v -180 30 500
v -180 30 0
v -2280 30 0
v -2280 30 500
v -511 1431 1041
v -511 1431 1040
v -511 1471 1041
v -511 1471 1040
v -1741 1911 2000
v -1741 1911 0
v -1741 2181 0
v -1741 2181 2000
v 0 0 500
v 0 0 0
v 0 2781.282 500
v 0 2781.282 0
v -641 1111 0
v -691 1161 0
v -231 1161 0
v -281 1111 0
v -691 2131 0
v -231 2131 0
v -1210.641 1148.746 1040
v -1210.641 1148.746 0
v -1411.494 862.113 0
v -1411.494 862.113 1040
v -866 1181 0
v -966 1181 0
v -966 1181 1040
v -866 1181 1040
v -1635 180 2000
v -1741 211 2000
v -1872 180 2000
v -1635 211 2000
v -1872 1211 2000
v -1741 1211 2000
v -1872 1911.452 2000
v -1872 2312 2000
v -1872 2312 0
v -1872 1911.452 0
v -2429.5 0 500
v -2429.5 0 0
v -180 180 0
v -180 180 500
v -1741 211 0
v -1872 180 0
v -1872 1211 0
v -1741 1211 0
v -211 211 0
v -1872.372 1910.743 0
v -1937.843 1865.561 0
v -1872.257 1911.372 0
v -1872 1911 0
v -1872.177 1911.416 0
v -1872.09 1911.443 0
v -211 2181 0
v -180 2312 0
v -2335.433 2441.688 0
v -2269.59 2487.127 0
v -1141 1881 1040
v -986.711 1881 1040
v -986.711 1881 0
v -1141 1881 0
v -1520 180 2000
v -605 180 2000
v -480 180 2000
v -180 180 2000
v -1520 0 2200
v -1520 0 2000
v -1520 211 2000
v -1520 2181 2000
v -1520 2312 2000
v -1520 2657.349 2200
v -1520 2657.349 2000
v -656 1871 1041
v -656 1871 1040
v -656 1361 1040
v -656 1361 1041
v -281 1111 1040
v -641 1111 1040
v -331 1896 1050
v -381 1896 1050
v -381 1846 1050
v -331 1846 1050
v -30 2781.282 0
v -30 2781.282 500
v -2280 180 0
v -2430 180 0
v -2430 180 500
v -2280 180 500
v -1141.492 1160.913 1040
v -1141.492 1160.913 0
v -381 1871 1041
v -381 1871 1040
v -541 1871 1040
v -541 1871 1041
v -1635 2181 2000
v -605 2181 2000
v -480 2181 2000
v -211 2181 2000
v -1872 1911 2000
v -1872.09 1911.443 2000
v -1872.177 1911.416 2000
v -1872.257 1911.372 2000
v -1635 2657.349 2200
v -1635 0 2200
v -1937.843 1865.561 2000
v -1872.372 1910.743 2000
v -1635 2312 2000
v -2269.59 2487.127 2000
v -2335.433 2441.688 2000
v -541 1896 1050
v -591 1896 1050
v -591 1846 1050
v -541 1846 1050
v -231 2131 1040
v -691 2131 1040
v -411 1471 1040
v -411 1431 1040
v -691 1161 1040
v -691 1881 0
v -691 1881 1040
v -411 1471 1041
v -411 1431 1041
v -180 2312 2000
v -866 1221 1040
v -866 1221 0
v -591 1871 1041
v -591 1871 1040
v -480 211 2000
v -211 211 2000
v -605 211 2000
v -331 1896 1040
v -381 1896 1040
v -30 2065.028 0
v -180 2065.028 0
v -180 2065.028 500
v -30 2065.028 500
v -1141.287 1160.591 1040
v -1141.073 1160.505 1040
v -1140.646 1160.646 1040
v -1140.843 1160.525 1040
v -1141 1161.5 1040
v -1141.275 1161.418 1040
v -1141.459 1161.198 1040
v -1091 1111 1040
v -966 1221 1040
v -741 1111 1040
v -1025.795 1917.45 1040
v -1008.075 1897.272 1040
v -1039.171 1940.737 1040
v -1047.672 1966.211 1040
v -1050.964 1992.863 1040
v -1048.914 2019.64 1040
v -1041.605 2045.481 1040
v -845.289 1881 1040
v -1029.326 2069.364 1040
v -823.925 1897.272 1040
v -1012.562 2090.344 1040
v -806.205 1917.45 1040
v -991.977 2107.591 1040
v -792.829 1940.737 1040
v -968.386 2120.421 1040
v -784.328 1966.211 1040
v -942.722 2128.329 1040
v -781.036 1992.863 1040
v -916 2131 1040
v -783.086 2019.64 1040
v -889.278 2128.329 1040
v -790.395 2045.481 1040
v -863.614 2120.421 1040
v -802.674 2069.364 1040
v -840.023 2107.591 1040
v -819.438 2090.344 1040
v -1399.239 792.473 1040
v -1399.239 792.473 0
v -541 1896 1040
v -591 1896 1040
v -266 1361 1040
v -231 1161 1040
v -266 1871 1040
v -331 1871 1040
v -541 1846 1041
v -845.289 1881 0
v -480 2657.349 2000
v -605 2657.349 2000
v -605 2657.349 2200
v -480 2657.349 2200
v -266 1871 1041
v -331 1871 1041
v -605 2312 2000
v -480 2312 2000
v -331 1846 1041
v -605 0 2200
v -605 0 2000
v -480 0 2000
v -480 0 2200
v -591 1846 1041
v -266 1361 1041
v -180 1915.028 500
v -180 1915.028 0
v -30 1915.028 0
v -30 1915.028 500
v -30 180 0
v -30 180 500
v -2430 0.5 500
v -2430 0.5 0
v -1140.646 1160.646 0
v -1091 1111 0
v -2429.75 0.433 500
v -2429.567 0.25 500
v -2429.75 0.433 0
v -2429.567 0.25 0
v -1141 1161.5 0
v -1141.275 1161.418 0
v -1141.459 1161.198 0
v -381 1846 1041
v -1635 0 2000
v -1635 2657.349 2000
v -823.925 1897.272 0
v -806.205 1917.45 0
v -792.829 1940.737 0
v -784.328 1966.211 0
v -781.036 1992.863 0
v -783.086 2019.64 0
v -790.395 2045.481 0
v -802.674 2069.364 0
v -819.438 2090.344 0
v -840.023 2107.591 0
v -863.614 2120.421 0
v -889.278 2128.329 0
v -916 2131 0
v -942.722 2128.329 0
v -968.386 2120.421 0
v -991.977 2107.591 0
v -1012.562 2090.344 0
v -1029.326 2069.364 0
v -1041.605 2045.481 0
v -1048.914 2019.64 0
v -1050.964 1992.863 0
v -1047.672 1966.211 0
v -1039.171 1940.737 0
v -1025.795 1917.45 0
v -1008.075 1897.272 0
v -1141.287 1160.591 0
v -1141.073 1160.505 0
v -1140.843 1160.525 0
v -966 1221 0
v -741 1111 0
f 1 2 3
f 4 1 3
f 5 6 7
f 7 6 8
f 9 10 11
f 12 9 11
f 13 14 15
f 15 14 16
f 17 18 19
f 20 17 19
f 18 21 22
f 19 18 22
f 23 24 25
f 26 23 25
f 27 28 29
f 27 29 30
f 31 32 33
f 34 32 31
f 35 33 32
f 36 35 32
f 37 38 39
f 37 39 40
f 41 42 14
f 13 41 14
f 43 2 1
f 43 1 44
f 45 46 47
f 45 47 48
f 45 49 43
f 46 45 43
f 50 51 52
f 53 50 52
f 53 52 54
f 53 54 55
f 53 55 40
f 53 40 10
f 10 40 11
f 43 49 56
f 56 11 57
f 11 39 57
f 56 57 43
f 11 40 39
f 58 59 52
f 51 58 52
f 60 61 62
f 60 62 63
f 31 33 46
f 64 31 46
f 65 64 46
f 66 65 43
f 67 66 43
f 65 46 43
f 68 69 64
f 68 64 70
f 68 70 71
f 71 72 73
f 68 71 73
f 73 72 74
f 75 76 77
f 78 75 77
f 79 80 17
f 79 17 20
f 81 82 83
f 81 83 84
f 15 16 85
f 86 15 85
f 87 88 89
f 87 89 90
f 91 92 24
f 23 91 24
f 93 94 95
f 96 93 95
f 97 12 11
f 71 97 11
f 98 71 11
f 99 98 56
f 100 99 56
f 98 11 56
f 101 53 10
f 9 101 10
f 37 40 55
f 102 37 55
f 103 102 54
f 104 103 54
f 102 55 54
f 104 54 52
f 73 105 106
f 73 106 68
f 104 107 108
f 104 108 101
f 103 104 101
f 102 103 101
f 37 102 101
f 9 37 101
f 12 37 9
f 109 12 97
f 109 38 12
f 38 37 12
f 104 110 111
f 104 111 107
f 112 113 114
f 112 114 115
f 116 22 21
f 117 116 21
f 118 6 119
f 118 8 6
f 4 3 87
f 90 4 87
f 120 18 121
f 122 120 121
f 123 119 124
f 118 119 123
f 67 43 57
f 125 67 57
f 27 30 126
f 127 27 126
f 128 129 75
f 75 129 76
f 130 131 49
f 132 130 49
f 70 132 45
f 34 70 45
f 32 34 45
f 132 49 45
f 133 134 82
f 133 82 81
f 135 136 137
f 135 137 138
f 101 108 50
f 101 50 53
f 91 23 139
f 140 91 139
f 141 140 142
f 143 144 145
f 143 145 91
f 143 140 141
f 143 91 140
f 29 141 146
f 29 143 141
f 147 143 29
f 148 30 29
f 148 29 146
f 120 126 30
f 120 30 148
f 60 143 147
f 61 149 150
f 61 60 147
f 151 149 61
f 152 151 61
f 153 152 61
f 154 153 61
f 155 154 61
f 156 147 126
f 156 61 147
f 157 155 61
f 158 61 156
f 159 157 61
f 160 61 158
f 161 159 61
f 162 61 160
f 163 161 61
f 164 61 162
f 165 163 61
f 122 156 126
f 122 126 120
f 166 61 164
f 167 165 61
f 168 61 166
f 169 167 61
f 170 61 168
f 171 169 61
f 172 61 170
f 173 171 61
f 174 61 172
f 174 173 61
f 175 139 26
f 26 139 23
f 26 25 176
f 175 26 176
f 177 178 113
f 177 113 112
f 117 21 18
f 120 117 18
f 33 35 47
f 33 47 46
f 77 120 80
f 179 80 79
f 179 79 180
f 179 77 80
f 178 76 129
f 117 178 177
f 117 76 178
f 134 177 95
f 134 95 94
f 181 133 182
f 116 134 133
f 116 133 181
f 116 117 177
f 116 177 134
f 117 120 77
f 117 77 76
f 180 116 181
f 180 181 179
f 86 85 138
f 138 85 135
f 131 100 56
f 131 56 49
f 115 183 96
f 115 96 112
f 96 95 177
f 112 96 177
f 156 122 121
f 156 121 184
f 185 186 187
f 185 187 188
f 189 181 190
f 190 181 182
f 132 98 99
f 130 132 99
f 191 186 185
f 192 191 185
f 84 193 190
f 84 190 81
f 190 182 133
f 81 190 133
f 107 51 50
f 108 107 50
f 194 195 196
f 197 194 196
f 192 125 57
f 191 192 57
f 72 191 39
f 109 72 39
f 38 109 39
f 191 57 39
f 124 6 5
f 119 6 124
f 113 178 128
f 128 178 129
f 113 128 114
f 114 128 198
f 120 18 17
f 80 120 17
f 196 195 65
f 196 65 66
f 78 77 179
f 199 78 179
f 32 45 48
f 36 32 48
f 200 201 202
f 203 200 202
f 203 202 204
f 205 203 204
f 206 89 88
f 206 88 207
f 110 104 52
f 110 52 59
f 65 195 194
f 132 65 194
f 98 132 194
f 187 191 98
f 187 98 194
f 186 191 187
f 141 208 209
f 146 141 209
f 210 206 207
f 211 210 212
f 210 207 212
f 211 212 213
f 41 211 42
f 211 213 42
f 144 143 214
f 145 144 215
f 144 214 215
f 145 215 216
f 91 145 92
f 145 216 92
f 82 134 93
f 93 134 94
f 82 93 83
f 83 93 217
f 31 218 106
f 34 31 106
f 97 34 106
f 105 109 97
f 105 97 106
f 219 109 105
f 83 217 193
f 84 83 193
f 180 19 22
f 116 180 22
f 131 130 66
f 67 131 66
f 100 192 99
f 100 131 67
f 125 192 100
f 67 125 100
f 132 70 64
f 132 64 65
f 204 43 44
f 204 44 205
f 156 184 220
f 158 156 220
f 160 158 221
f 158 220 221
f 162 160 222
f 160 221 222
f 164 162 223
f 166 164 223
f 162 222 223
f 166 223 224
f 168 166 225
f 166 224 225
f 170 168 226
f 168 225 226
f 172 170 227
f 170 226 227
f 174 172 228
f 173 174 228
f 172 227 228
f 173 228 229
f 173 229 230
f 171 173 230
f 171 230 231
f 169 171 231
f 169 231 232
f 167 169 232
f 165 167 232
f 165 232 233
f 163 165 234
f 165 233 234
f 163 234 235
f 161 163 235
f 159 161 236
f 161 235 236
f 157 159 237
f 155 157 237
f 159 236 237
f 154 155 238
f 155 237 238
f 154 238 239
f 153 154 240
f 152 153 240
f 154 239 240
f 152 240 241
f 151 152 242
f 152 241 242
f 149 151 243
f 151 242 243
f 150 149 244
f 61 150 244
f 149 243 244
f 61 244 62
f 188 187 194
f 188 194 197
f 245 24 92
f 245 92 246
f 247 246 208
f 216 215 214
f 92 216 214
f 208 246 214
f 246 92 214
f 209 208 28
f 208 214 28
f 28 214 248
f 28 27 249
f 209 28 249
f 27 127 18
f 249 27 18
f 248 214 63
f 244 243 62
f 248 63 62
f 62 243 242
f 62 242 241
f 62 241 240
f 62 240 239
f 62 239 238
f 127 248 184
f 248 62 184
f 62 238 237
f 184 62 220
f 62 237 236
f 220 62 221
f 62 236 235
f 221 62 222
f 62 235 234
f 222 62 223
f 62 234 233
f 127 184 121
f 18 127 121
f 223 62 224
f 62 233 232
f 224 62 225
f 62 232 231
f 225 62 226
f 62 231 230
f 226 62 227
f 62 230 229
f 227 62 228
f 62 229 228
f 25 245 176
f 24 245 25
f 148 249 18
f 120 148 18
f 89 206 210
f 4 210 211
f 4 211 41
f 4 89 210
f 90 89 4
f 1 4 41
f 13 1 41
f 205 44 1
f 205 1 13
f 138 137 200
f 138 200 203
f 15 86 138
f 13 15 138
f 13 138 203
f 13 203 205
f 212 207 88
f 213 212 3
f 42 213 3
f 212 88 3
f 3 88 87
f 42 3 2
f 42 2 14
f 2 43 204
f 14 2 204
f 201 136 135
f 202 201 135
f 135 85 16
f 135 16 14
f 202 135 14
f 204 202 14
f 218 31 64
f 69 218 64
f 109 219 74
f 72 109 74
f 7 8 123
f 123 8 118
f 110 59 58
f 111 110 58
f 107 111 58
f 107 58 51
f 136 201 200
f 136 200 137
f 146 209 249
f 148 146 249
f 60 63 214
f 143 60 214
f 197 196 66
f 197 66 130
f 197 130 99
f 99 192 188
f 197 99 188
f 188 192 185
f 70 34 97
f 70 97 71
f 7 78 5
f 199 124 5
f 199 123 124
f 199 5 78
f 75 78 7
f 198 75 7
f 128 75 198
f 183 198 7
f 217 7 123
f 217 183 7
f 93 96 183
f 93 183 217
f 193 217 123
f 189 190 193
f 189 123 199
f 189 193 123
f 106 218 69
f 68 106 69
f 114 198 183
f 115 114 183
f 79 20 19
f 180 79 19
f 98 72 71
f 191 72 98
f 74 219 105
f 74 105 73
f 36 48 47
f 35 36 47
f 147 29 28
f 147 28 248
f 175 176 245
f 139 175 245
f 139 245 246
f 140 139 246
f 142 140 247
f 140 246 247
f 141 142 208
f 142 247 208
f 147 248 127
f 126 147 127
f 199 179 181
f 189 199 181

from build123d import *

# Parameters (mm, degrees)
F0_W     = 100
F0_H     = 40
F0_W_2   = 130
F0_H_2   = 65.0866451263
F1_DEPTH = 1040
F0_W_3   = 50
F0_H_3   = 25
F2_DEPTH = 1040
F3_DEPTH = 1041
F4_DEPTH = 1050
F0_W_4   = 31
F0_H_4   = 131
F0_H_5   = 31
F5_DEPTH = 2000
F6_W     = 125
F6_H     = 2657.3488712311
F6_W_2   = 115
F7_DEPTH = 200
F0_W_5   = 150
F0_H_6   = 150
F8_DEPTH = 500


# Not quite as in the source:
# - a feature names something its author has since deleted; it is built from what else it names


with BuildPart() as f1:
    # F0 (on Top) → F1 (new body)
    with BuildSketch(Plane.XY):
        with BuildLine():
            ThreePointArc((-845.2893218813, 1881), (-916, 1861), (-986.7106781187, 1881))
            Line((-986.7106781187, 1881), (-1141, 1881))
            Line((-1141, 1881), (-1141, 1161.5))
            ThreePointArc((-1141, 1161.5), (-1140.6464466094, 1161.3535533906), (-1140.5, 1161))
            ThreePointArc((-1140.5, 1161), (-1140.5380602337, 1160.8086582838), (-1140.6464466094, 1160.6464466094))
            Line((-1140.6464466094, 1160.6464466094), (-1091, 1111))
            Line((-1091, 1111), (-741, 1111))
            Line((-741, 1111), (-691, 1161))
            Line((-691, 1161), (-691, 1881))
            Line((-691, 1881), (-845.2893218813, 1881))
        make_face()
        with Locations((-916, 1201)):
            Rectangle(F0_W, F0_H, mode=Mode.SUBTRACT)
        with BuildLine():
            Line((-851, 1881), (-981, 1881))
            Line((-981, 1881), (-986.7106781187, 1881))
            ThreePointArc((-986.7106781187, 1881), (-916, 1861), (-845.2893218813, 1881))
            Line((-845.2893218813, 1881), (-851, 1881))
        make_face()
        with BuildLine():
            Line((-1141.2869326556, 1160.590525152), (-1141, 1161))
            Line((-1141, 1161), (-1141.4924344683, 1160.9133495848))
            ThreePointArc((-1141.4924344683, 1160.9133495848), (-1141.421790448, 1160.7314989424), (-1141.2869326556, 1160.590525152))
        make_face()
        with BuildLine():
            ThreePointArc((-1141.2869326556, 1160.590525152), (-1141.421790448, 1160.7314989424), (-1141.4924344683, 1160.9133495848))
            Line((-1141.4924344683, 1160.9133495848), (-1210.6407503609, 1148.7457807602))
            Line((-1210.6407503609, 1148.7457807602), (-1411.4936092846, 862.1133871579))
            Line((-1411.4936092846, 862.1133871579), (-1399.2393900448, 792.4726367971))
            Line((-1399.2393900448, 792.4726367971), (-1141.2869326556, 1160.590525152))
        make_face()
        with BuildLine():
            ThreePointArc((-1140.5, 1161), (-1140.6464466094, 1161.3535533906), (-1141, 1161.5))
            Line((-1141, 1161.5), (-1141, 1161))
            Line((-1141, 1161), (-1140.6464466094, 1160.6464466094))
            ThreePointArc((-1140.6464466094, 1160.6464466094), (-1140.5380602337, 1160.8086582838), (-1140.5, 1161))
        make_face()
        with BuildLine():
            Line((-1140.6464466094, 1160.6464466094), (-1141, 1161))
            Line((-1141, 1161), (-1141.2869326556, 1160.590525152))
            ThreePointArc((-1141.2869326556, 1160.590525152), (-1140.9565099674, 1160.5018949739), (-1140.6464466094, 1160.6464466094))
        make_face()
        with BuildLine():
            Line((-1141, 1161), (-1141, 1161.5))
            ThreePointArc((-1141, 1161.5), (-1141.3829655387, 1161.3214613448), (-1141.4924344683, 1160.9133495848))
            Line((-1141.4924344683, 1160.9133495848), (-1141, 1161))
        make_face()
        with Locations((-916, 1913.5433225632)):
            Rectangle(F0_W_2, F0_H_2)
        with BuildLine():
            Line((-986.7106781187, 1881), (-981, 1881))
            Line((-981, 1881), (-981, 1946.0866451263))
            Line((-981, 1946.0866451263), (-851, 1946.0866451263))
            Line((-851, 1946.0866451263), (-851, 1881))
            Line((-851, 1881), (-845.2893218813, 1881))
            ThreePointArc((-845.2893218813, 1881), (-798.1633725321, 1930.1248967592), (-781, 1996))
            ThreePointArc((-781, 1996), (-981.8751032408, 2113.8366274679), (-986.7106781187, 1881))
        make_face()
    extrude(amount=F1_DEPTH)


with BuildPart() as f2:
    # F0 (on Top) → F2 (new body)
    with BuildSketch(Plane.XY):
        Polygon((-691, 2131), (-691, 1881), (-691, 1161), (-641, 1111), (-281, 1111), (-231, 1161), (-231, 2131), align=None)
        Polygon((-656, 1361), (-656, 1871), (-591, 1871), (-591, 1896), (-541, 1896), (-541, 1871), (-381, 1871), (-381, 1896), (-331, 1896), (-331, 1871), (-266, 1871), (-266, 1361), align=None, mode=Mode.SUBTRACT)
        Polygon((-591, 1871), (-656, 1871), (-656, 1361), (-266, 1361), (-266, 1871), (-331, 1871), (-331, 1846), (-381, 1846), (-381, 1871), (-541, 1871), (-541, 1846), (-591, 1846), align=None)
        with Locations((-461, 1451)):
            Rectangle(F0_W, F0_H, mode=Mode.SUBTRACT)
        with Locations((-461, 1451)):
            Rectangle(F0_W, F0_H)
        with Locations((-566, 1858.5)):
            Rectangle(F0_W_3, F0_H_3)
        with Locations((-566, 1883.5)):
            Rectangle(F0_W_3, F0_H_3)
        with Locations((-356, 1883.5)):
            Rectangle(F0_W_3, F0_H_3)
        with Locations((-356, 1858.5)):
            Rectangle(F0_W_3, F0_H_3)
    extrude(amount=F2_DEPTH)

    # F0 (on Top) → F3 (join)
    with BuildSketch(Plane.XY):
        Polygon((-591, 1871), (-656, 1871), (-656, 1361), (-266, 1361), (-266, 1871), (-331, 1871), (-331, 1846), (-381, 1846), (-381, 1871), (-541, 1871), (-541, 1846), (-591, 1846), align=None)
        with Locations((-461, 1451)):
            Rectangle(F0_W, F0_H, mode=Mode.SUBTRACT)
    extrude(amount=F3_DEPTH)

    # F0 (on Top) → F4 (join)
    with BuildSketch(Plane.XY):
        with Locations((-566, 1883.5)):
            Rectangle(F0_W_3, F0_H_3)
        with Locations((-566, 1858.5)):
            Rectangle(F0_W_3, F0_H_3)
        with Locations((-356, 1883.5)):
            Rectangle(F0_W_3, F0_H_3)
        with Locations((-356, 1858.5)):
            Rectangle(F0_W_3, F0_H_3)
    extrude(amount=F4_DEPTH)


with BuildPart() as f5:
    # F0 (on Top) → F5 (new body)
    with BuildSketch(Plane.XY):
        with BuildLine():
            Line((-1741, 2181), (-211, 2181))
            Line((-211, 2181), (-211, 2312))
            Line((-211, 2312), (-1872, 2312))
            Line((-1872, 2312), (-1872, 1911.4519278278))
            ThreePointArc((-1872, 1911.4519278278), (-1871.6804387684, 1911.3195612316), (-1871.5480721722, 1911))
            Line((-1871.5480721722, 1911), (-1741, 1911))
            Line((-1741, 1911), (-1741, 2181))
        make_face()
        with Locations((-195.5, 2246.5)):
            Rectangle(F0_W_4, F0_H_4)
        Polygon((-180, 1915.0275195633), (-180, 2065.0275195633), (-180, 2181), (-211, 2181), (-211, 211), (-180, 211), align=None)
        with Locations((-195.5, 195.5)):
            Rectangle(F0_W_4, F0_H_5)
        Polygon((-1872, 180), (-211, 180), (-211, 211), (-1741, 211), (-1741, 1211), (-1872, 1211), align=None)
        with BuildLine():
            Line((-1872.3719540131, 1910.743311524), (-1872, 1911))
            Line((-1872, 1911), (-1872.256688476, 1911.3719540131))
            ThreePointArc((-1872.256688476, 1911.3719540131), (-1872.444517367, 1911.0815050429), (-1872.3719540131, 1910.743311524))
        make_face()
        with BuildLine():
            ThreePointArc((-1872.3719540131, 1910.743311524), (-1872.444517367, 1911.0815050429), (-1872.256688476, 1911.3719540131))
            Line((-1872.256688476, 1911.3719540131), (-2269.5898852459, 2487.1269679074))
            Line((-2269.5898852459, 2487.1269679074), (-2335.4329672925, 2441.6881238793))
            Line((-2335.4329672925, 2441.6881238793), (-1937.8430820466, 1865.5611559719))
            Line((-1937.8430820466, 1865.5611559719), (-1872.3719540131, 1910.743311524))
        make_face()
        with BuildLine():
            ThreePointArc((-1871.5480721722, 1911), (-1871.6804387684, 1911.3195612316), (-1872, 1911.4519278278))
            Line((-1872, 1911.4519278278), (-1872, 1911))
            Line((-1872, 1911), (-1871.5480721722, 1911))
        make_face()
        with BuildLine():
            Line((-1872, 1911), (-1872, 1911.4519278278))
            ThreePointArc((-1872, 1911.4519278278), (-1872.1344291493, 1911.4314713958), (-1872.256688476, 1911.3719540131))
            Line((-1872.256688476, 1911.3719540131), (-1872, 1911))
        make_face()
    extrude(amount=F5_DEPTH)

    # F6 (on face) → F7 (join)
    with BuildSketch(Plane.XY.offset(2000)):
        with Locations((-542.5, 1328.6744356155)):
            Rectangle(F6_W, F6_H)
        with Locations((-1577.5, 1328.6744356155)):
            Rectangle(F6_W_2, F6_H)
    extrude(amount=F7_DEPTH)


with BuildPart() as f8:
    # F0 (on Top) → F8 (new body)
    with BuildSketch(Plane.XY):
        with Locations((-2355, 105)):
            Rectangle(F0_W_5, F0_H_6)
        with BuildLine():
            Line((0, 2781.2819480896), (-30, 2781.2819480896))
            Line((-30, 2781.2819480896), (-30, 2065.0275195633))
            Line((-30, 2065.0275195633), (-30, 1915.0275195633))
            Line((-30, 1915.0275195633), (-30, 180))
            Line((-30, 180), (-30, 30))
            Line((-30, 30), (-180, 30))
            Line((-180, 30), (-2280, 30))
            Line((-2280, 30), (-2430, 30))
            Line((-2430, 30), (-2430, 0.5))
            ThreePointArc((-2430, 0.5), (-2429.6464466094, 0.3535533906), (-2429.5, 0))
            Line((-2429.5, 0), (0, 0))
            Line((0, 0), (0, 2781.2819480896))
        make_face()
        with Locations((-105, 105)):
            Rectangle(F0_W_5, F0_H_6)
        with Locations((-105, 1990.0275195633)):
            Rectangle(F0_W_5, F0_H_6)
    extrude(amount=F8_DEPTH)


solid = Compound([f1.part, f2.part, f5.part, f8.part])
